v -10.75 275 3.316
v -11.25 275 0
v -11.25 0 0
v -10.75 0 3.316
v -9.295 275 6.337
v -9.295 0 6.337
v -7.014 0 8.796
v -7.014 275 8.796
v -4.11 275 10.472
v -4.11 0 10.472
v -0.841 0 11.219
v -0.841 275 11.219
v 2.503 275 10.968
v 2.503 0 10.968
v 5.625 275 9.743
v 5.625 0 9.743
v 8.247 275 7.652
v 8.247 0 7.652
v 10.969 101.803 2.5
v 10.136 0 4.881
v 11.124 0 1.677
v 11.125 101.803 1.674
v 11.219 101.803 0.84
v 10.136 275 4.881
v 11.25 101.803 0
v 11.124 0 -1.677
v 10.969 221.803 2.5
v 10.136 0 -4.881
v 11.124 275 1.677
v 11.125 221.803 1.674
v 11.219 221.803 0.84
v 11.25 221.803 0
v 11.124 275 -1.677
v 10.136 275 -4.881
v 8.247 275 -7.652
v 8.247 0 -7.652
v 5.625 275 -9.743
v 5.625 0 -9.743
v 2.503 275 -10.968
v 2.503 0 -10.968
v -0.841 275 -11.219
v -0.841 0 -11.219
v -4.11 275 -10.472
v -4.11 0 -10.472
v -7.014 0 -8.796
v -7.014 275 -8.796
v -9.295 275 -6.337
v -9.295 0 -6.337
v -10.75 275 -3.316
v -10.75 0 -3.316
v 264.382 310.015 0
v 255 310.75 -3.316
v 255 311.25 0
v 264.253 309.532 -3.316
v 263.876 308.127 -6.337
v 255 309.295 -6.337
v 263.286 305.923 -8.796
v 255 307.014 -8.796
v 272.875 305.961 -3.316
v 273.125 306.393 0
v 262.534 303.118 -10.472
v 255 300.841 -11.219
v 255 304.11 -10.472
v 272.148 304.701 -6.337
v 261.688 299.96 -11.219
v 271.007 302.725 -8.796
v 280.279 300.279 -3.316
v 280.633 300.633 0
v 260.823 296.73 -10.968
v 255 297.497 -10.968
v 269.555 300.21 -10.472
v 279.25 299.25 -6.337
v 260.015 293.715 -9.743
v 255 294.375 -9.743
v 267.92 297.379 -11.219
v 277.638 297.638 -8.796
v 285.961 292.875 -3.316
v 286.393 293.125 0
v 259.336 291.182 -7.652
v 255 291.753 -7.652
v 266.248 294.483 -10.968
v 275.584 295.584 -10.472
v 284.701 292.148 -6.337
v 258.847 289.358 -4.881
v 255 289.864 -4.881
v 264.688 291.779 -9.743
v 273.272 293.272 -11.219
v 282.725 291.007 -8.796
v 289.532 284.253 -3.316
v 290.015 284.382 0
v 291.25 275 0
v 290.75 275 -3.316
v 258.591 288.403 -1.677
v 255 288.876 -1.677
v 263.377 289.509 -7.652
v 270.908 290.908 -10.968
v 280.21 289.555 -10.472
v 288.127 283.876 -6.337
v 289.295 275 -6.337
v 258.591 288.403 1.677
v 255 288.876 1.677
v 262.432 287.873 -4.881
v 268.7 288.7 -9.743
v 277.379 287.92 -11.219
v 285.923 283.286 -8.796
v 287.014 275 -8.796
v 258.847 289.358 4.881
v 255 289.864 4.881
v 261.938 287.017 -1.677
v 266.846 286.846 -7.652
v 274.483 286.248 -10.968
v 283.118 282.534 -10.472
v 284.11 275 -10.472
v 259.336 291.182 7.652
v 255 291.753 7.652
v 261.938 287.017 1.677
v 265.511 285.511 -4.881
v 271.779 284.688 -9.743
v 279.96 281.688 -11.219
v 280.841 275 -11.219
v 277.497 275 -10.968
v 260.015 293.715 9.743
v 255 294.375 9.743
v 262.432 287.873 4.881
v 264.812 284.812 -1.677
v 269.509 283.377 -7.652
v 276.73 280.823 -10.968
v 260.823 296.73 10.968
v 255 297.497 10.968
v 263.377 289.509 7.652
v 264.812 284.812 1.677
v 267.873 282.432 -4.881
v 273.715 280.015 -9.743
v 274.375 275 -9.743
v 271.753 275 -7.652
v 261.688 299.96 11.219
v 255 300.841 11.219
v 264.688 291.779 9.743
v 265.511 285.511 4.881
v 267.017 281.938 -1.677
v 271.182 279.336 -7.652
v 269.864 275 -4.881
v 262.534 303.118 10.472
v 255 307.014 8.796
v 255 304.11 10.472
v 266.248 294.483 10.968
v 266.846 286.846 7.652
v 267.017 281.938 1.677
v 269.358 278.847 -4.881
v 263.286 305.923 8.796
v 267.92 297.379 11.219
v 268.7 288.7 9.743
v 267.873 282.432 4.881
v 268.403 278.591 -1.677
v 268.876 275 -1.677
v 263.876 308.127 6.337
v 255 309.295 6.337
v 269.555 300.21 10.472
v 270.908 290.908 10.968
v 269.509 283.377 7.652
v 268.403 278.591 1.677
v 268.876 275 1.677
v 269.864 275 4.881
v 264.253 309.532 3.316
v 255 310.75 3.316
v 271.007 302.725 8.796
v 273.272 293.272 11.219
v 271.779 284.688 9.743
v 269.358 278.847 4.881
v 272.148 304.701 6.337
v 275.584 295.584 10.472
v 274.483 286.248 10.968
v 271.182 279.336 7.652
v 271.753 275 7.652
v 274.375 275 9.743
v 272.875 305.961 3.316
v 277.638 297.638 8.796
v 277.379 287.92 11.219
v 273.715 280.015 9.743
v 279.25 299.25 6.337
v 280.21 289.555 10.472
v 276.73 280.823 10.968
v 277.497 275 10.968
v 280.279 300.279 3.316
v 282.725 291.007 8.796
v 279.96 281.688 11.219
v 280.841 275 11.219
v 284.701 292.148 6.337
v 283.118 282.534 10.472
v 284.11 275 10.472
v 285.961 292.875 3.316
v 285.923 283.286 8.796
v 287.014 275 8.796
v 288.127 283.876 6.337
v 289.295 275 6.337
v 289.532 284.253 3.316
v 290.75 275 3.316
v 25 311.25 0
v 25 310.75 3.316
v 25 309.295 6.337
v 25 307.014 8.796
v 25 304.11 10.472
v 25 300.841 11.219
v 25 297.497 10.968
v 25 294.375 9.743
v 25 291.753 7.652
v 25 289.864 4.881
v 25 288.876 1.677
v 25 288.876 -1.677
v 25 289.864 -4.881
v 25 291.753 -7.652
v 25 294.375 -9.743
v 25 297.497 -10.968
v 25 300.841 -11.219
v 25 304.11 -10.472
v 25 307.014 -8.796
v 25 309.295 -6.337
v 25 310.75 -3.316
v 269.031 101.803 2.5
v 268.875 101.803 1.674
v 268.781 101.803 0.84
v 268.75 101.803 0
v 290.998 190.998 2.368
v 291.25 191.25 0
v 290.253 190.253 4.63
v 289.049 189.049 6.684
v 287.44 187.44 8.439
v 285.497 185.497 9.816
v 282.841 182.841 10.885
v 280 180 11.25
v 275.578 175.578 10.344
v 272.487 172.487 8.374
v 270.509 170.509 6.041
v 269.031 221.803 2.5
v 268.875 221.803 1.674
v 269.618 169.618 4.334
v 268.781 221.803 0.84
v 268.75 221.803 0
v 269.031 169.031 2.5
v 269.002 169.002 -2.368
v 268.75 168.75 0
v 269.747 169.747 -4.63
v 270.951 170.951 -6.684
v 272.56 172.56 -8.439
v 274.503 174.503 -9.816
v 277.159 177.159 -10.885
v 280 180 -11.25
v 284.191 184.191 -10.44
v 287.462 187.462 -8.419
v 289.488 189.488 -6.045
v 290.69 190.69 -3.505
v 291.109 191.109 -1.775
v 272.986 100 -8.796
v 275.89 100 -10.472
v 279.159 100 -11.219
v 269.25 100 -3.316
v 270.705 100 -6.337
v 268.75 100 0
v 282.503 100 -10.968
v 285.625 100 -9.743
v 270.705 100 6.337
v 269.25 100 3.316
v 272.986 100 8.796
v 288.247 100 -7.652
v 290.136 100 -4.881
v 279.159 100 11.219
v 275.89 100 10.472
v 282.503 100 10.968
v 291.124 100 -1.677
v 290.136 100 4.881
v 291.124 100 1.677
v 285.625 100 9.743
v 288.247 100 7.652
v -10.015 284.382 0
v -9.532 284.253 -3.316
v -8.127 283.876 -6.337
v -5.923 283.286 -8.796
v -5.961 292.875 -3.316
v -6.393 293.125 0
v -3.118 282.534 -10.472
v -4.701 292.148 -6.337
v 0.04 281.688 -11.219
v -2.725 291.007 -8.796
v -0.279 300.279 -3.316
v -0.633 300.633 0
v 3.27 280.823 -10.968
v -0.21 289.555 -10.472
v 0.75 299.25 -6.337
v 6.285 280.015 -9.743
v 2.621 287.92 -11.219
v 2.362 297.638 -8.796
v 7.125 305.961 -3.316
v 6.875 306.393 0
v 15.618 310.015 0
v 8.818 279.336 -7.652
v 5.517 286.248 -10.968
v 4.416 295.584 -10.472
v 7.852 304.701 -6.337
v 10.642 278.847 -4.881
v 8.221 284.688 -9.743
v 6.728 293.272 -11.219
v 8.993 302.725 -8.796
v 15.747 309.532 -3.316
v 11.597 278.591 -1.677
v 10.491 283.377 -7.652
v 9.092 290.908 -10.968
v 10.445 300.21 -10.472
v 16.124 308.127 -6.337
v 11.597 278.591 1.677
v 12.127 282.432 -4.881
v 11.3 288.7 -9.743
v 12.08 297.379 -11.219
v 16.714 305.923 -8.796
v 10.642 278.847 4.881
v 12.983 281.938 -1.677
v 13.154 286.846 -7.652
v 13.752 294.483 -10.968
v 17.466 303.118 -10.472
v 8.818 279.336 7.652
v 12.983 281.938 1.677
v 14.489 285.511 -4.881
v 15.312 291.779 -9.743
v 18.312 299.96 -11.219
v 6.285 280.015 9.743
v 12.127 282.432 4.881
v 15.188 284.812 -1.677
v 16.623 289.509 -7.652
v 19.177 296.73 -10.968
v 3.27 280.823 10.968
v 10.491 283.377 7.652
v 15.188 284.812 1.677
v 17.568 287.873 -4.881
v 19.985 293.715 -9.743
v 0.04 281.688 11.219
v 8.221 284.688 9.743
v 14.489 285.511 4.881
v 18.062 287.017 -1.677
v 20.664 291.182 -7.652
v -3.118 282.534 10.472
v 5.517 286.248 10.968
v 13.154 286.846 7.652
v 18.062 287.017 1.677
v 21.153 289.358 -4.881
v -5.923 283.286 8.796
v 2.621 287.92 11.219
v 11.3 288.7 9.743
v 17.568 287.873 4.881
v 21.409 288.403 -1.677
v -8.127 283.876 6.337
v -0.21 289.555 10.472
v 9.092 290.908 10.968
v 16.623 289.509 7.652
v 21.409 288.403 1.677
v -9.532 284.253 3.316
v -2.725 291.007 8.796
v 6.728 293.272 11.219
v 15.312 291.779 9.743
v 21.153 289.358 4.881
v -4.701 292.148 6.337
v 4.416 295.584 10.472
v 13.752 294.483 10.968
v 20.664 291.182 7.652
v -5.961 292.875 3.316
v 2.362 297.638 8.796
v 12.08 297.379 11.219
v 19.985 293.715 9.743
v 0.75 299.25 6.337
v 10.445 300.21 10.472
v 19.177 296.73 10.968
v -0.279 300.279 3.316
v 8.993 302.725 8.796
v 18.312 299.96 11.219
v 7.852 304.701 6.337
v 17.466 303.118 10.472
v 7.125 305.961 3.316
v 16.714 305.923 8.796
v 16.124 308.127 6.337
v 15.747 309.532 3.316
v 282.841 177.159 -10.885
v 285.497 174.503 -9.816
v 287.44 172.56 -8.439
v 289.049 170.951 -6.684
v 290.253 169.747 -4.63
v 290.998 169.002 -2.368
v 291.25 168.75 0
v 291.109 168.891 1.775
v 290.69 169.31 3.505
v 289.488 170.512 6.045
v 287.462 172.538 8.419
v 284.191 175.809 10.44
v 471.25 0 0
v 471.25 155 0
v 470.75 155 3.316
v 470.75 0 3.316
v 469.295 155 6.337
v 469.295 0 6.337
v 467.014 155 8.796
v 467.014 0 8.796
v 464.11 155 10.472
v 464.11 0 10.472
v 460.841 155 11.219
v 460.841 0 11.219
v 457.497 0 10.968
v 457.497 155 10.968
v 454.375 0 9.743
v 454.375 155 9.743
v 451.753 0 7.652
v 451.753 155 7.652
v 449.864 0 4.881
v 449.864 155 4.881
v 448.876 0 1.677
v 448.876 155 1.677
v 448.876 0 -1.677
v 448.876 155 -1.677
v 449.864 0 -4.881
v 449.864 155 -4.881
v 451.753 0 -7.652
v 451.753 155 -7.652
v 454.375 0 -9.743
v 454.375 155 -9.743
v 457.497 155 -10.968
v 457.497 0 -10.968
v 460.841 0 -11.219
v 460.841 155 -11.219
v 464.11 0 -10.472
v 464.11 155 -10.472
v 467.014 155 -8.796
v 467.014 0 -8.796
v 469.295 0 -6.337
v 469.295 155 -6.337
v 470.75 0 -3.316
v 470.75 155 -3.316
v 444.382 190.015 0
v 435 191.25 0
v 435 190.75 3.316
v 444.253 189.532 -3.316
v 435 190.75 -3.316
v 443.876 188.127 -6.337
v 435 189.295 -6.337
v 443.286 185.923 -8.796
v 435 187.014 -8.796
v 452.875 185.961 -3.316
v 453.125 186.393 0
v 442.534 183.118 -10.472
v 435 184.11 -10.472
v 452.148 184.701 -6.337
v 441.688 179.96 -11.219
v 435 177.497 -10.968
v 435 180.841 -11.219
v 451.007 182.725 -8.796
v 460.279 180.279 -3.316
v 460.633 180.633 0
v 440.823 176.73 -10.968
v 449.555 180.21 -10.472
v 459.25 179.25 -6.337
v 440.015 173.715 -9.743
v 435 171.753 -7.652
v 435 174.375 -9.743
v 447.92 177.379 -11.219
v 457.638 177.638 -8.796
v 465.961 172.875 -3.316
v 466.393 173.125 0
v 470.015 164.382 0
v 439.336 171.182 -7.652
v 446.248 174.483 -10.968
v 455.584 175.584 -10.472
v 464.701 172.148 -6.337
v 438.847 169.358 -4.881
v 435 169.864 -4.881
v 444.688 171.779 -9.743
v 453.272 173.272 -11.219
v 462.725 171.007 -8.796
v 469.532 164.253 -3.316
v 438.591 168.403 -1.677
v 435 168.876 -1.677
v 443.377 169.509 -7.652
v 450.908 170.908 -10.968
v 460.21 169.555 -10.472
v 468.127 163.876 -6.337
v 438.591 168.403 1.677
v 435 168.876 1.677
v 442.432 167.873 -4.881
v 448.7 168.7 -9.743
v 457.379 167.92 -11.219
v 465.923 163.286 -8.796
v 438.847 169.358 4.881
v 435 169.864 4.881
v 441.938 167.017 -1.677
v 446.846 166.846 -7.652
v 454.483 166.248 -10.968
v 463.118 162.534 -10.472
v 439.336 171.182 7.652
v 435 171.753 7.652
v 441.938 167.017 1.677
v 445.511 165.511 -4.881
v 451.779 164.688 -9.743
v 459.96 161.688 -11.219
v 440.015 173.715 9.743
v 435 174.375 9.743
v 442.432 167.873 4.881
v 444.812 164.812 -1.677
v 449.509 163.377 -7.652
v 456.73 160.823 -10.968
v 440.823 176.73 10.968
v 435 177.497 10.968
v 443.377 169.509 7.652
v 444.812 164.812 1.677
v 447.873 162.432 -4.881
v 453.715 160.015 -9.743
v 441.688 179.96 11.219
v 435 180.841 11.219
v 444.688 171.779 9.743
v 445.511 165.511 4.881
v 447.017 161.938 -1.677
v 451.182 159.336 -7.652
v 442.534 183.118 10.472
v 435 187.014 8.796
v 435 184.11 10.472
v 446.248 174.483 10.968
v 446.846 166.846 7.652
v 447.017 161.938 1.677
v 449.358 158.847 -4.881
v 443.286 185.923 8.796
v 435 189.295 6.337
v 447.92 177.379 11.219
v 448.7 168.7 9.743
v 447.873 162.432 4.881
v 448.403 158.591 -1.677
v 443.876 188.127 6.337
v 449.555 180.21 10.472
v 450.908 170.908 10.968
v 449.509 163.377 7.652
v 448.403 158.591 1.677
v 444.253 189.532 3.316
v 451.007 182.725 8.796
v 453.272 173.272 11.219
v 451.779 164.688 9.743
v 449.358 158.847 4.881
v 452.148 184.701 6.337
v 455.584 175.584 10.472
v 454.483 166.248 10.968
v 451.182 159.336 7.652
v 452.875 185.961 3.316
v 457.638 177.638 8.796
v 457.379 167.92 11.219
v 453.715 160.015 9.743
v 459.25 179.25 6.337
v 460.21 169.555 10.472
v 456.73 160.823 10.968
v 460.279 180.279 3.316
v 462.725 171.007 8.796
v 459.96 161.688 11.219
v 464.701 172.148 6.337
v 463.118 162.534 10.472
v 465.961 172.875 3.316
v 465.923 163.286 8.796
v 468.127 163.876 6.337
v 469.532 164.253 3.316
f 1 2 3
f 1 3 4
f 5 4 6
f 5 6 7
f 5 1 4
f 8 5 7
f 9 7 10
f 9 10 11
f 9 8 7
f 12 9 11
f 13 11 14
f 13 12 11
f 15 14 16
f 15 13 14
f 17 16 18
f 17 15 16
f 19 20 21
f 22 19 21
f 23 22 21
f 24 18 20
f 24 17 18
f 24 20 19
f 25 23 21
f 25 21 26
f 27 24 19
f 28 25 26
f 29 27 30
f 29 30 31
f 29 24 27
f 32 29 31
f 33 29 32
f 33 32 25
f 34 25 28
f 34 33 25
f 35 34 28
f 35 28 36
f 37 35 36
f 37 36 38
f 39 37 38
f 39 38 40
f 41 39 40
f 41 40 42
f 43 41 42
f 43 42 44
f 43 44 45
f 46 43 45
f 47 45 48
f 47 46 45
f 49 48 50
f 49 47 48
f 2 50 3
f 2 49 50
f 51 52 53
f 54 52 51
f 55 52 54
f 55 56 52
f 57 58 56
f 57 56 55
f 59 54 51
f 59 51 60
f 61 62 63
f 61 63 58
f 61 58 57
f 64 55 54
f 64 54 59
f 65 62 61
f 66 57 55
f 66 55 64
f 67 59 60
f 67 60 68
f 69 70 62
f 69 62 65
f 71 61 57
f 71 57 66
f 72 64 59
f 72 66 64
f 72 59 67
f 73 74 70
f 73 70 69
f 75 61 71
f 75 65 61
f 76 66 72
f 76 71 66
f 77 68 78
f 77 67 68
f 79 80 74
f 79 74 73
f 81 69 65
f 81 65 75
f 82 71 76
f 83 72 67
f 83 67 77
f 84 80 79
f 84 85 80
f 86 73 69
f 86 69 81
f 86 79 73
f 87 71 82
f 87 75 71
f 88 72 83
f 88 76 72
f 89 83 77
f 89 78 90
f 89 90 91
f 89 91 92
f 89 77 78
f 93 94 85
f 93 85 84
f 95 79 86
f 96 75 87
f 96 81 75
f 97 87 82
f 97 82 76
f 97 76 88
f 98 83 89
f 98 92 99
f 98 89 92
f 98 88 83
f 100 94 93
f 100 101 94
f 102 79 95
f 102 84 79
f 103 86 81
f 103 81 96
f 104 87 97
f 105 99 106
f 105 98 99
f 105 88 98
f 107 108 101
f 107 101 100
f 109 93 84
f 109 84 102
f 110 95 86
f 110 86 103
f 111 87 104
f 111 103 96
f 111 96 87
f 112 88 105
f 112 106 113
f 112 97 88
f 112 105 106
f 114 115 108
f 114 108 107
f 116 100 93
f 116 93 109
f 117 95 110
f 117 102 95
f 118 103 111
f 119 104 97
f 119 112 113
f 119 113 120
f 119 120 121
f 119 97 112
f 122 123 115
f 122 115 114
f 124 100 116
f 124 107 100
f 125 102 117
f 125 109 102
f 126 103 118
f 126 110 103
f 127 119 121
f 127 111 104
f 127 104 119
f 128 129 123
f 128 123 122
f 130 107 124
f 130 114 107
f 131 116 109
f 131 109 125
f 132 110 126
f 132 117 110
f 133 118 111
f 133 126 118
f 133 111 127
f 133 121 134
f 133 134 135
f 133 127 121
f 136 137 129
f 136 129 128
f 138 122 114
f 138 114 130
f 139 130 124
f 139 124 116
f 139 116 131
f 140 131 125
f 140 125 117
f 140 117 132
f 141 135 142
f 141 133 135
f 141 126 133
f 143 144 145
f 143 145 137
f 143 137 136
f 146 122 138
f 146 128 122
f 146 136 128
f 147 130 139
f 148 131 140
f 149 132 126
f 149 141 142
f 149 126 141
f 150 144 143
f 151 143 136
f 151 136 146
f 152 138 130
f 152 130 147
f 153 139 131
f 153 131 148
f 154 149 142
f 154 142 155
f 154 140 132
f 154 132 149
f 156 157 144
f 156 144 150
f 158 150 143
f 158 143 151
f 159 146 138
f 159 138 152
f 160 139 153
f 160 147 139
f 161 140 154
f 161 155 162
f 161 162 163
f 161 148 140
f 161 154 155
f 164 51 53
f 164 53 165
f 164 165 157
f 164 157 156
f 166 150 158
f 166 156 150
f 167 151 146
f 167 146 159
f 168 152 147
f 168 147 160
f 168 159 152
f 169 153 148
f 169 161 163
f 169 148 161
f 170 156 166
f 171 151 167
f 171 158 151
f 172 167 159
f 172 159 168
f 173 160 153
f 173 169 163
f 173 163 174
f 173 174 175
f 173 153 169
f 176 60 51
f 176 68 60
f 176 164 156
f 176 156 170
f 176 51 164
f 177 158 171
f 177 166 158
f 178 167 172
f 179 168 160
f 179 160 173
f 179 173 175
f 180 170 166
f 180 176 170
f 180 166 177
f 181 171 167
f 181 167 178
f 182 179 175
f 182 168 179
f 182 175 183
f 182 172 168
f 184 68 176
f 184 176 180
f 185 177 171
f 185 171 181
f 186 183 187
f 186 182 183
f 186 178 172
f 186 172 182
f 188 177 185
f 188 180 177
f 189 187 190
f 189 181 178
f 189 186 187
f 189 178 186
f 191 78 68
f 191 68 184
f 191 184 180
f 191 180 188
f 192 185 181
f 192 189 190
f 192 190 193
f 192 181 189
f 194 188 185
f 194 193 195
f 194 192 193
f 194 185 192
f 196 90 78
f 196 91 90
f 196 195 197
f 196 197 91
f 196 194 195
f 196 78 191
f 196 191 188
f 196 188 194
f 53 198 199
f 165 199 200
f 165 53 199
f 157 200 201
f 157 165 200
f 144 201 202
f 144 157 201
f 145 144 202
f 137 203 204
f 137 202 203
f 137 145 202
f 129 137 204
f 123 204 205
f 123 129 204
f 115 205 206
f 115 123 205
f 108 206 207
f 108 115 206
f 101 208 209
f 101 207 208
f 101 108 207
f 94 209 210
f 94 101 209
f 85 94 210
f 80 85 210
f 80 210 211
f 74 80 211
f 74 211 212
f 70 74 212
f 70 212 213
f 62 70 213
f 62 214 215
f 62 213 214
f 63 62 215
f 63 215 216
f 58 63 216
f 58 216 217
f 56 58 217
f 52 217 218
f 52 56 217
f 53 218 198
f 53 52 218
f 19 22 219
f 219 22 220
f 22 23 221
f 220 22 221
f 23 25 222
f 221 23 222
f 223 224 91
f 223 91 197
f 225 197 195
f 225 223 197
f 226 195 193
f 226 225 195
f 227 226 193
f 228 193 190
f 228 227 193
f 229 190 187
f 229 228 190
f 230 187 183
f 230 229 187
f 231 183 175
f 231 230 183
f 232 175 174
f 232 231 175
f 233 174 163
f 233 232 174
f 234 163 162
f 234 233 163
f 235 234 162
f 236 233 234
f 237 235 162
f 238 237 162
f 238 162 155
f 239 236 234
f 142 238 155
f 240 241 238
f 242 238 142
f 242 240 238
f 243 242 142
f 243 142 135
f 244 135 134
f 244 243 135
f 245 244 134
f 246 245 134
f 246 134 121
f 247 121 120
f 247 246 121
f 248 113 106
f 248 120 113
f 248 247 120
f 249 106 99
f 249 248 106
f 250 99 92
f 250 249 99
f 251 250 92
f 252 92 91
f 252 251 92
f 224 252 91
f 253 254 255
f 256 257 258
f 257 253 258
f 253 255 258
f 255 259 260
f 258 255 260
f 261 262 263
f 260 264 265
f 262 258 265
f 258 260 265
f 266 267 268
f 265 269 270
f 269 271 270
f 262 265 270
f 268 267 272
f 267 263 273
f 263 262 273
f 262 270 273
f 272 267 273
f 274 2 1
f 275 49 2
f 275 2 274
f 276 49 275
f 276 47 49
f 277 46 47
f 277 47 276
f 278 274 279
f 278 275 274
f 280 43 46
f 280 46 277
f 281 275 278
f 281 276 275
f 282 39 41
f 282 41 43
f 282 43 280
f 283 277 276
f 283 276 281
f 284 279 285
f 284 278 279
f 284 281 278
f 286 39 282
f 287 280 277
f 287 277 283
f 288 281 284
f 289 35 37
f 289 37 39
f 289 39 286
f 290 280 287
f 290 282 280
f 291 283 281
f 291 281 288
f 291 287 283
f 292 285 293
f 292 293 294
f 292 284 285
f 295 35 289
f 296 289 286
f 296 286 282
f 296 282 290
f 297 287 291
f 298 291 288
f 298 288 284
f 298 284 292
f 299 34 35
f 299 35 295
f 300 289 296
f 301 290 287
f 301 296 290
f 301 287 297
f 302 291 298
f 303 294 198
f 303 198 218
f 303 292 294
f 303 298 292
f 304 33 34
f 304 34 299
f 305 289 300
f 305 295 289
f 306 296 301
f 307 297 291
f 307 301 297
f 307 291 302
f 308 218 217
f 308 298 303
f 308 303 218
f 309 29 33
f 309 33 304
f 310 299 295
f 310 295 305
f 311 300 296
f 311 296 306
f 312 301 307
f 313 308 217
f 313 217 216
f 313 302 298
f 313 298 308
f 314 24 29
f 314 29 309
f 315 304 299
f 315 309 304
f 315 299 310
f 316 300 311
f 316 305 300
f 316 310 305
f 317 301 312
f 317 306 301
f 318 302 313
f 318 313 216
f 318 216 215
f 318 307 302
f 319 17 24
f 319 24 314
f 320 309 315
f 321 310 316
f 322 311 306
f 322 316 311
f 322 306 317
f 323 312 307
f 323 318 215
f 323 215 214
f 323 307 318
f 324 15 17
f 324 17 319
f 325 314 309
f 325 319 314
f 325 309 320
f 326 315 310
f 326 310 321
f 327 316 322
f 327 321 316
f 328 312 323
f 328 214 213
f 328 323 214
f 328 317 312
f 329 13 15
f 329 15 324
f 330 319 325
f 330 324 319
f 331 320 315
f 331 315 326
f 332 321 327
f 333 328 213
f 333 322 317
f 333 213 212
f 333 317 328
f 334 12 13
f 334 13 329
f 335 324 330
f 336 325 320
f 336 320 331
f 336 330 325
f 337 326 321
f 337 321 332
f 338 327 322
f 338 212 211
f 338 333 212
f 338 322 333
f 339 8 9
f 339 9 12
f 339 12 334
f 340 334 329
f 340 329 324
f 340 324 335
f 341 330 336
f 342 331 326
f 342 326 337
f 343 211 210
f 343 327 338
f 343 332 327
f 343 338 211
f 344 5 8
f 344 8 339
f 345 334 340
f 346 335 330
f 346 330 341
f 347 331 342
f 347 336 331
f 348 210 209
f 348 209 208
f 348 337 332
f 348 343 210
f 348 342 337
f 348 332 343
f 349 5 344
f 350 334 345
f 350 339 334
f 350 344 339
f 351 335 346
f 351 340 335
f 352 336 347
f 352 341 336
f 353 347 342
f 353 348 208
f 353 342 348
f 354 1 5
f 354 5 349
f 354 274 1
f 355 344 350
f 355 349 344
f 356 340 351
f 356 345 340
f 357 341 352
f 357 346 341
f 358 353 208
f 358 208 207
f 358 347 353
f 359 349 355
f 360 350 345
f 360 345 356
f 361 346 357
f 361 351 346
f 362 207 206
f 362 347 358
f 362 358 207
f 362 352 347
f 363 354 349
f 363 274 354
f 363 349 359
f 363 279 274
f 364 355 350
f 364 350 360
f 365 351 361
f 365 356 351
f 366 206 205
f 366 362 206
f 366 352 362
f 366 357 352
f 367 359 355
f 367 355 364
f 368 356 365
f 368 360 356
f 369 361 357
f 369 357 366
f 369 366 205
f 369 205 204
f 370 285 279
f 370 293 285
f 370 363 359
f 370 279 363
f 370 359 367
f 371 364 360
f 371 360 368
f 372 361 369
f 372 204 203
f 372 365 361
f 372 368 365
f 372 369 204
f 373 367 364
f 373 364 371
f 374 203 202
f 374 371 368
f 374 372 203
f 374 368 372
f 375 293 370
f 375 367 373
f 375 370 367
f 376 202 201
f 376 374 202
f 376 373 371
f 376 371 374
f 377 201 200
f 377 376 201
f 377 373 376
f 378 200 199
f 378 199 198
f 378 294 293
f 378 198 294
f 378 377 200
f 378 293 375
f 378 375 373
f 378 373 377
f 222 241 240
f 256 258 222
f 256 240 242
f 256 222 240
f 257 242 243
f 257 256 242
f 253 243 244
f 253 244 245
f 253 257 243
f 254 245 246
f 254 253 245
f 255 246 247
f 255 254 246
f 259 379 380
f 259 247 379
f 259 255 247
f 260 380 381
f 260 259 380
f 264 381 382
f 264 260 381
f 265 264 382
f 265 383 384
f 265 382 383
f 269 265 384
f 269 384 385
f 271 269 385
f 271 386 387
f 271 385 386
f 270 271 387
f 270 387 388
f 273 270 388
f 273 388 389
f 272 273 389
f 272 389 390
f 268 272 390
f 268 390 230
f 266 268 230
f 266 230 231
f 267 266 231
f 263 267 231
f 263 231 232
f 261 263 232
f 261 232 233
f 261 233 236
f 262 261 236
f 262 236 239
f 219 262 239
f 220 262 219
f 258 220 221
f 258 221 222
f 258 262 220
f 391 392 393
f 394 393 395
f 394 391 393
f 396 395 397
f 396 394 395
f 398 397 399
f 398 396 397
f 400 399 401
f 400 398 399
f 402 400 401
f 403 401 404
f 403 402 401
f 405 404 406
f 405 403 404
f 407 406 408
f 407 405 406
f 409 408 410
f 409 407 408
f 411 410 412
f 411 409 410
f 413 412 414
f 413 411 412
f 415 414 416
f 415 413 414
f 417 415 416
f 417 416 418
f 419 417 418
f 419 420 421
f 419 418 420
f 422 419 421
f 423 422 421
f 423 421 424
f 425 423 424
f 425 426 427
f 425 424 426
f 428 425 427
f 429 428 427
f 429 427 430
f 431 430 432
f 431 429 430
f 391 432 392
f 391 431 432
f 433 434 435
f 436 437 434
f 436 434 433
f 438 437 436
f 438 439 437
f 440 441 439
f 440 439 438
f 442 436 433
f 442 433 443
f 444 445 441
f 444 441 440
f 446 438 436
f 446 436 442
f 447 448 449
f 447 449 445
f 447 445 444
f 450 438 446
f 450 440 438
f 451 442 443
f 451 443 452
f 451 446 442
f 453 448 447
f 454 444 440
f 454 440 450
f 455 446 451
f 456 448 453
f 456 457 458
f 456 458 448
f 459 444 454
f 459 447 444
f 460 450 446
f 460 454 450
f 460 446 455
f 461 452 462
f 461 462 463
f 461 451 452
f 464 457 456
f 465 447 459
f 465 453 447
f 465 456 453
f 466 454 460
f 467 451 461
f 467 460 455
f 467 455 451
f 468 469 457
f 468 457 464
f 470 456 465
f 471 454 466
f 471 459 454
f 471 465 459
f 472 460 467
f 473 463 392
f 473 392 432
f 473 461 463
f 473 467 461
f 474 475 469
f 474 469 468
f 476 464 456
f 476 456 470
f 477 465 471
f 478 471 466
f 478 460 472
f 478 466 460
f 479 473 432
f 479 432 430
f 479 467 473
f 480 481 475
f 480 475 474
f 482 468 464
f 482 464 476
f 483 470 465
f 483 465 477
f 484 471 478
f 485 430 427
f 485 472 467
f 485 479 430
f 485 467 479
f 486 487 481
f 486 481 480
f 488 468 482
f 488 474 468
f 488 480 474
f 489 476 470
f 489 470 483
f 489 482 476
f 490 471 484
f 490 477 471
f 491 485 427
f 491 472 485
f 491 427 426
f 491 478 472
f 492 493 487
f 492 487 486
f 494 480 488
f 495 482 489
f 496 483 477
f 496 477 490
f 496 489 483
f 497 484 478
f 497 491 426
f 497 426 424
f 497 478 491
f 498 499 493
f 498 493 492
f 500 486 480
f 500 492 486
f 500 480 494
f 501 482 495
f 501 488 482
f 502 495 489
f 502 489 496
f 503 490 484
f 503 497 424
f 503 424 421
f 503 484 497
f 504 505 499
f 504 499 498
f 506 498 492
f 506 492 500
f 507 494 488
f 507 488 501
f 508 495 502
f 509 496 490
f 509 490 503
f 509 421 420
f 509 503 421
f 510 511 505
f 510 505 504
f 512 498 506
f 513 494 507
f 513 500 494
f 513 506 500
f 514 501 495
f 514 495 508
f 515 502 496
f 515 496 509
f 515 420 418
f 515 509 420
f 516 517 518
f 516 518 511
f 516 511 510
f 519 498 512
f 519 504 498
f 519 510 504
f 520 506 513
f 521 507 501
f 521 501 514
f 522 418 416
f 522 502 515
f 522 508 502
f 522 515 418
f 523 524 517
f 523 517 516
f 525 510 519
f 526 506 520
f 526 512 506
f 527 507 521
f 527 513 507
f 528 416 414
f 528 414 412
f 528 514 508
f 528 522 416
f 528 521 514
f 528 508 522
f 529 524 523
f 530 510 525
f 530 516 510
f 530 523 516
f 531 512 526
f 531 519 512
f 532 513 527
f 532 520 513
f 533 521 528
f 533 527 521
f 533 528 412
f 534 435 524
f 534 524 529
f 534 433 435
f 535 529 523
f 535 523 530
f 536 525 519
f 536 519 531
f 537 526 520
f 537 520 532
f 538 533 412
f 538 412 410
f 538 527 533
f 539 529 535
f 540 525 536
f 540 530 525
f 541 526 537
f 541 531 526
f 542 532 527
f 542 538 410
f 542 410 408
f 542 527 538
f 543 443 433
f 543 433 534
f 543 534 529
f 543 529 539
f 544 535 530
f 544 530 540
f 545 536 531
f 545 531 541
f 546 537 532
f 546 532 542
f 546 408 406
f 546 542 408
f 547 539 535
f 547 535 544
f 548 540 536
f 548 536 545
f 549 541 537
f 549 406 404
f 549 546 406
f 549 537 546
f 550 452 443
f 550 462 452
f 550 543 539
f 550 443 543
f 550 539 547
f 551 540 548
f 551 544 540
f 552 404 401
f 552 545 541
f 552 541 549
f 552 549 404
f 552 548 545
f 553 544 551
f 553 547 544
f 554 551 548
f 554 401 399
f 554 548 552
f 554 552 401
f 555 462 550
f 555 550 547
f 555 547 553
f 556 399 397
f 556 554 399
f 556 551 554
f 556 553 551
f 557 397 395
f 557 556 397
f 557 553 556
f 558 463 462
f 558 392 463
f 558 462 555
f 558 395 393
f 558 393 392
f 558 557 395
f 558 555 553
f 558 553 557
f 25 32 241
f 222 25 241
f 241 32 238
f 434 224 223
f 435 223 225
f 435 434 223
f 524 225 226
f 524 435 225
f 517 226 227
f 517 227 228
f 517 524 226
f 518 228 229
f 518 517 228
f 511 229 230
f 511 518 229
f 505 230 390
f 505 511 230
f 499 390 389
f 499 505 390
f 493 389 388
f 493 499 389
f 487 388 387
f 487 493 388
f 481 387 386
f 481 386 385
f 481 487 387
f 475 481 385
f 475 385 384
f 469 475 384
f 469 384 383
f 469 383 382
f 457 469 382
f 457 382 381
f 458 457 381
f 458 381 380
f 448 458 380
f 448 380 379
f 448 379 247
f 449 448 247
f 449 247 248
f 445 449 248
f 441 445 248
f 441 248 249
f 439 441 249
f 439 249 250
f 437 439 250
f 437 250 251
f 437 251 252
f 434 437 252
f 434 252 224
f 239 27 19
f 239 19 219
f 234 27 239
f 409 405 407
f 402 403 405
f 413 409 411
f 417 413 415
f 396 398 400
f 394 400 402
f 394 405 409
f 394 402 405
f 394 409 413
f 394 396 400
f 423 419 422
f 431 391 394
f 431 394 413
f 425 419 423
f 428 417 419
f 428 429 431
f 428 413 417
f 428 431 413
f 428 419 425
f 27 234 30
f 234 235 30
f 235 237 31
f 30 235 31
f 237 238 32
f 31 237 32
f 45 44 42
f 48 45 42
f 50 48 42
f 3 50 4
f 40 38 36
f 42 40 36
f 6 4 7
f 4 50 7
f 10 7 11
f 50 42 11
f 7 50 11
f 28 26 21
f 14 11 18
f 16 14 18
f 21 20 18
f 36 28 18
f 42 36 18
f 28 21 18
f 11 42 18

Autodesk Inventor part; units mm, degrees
ref_plane "YZ Plane" through (0, 0, 0) normal (1, 0, 0) x (0, 1, 0)
ref_plane "XY Plane" through (0, 0, 0) normal (0, 0, 1) x (1, 0, 0)
sketch "Sketch1" plane through (0, 0, 0) normal (0, 0, 1) x (1, 0, 0)
  line L0 (0, 0) -> (0, 275)
  line L1 (25, 300) -> (255, 300)
  line L2 (280, 275) -> (280, 180)
  line L3 (280, 180) -> (435, 180)
  line L4 (460, 155) -> (460, 0)
  arc A0 (25, 300) -> (0, 275) centre (25, 275) ccw
  arc A1 (280, 275) -> (255, 300) centre (255, 275) ccw
  arc A2 (460, 155) -> (435, 180) centre (435, 155) ccw
  line L5 (280, 180) -> (280, 93.2639)
  point P0 (0, 300)
  point P1 (280, 300)
  point P2 (460, 180)
  dimension "d0" = 300
  dimension "d1" = 280
  dimension "d2" = 120
  dimension "d3" = 180
  dimension "d4" = 25
  dimension "d5" = 25
  dimension "d6" = 25
  dimension "d7" = 86.7361
sketch "Sketch2" plane through (0, 0, 0) normal (0, 1, 0) x (-1, 0, 0)
  circle A0 centre (0, 0) radius 11.25
  dimension "d8" = 22.5
sweep "Sweep1" add profiles "Sketch2" path "Sketch1" path curves L0 A0 L1 A1 L2 L3 A2 L4
sketch "Sketch3" plane through (0, 0, 0) normal (0, 1, 0) x (-1, 0, 0)
  point P0 (0, 0)
sketch "Sketch4" plane through (0, 0, 0) normal (0, 0, 1) x (1, 0, 0)
  line L0 (280, 180) -> (280, 180) projected
  line L1 (280, 180) -> (280, 100)
  point P0 (0, 0)
  dimension "d11" = 80
ref_plane "Work Plane1" through (0, 100, 0) normal (0, 1, 0) x (-1, 0, 0)
sketch "Sketch5" plane through (0, 100, 0) normal (0, 1, 0) x (-1, 0, 0)
  circle A0 centre (-280, 0) radius 11.25 projected
  circle A1 centre (-280, 0) radius 11.25
  point P0 (0, 0)
  dimension "d13" = 22.5
sweep "Sweep2" add profiles "Sketch5" path "Sketch4" path curves L1
sketch "Sketch6" plane through (0, 0, 0) normal (0, 0, 1) x (1, 0, 0)
  line L0 (0, 101.8033) -> (281.8033, 101.8033)
  line L1 (281.8033, 101.8033) -> (281.8033, 221.8033)
  line L2 (281.8033, 221.8033) -> (0, 221.8033)
  line L3 (0, 221.8033) -> (0, 101.8033)
  point P0 (0, 0)
  dimension "d16" = 120
extrude "Extrusion1" add sketch "Sketch6" along normal blind 2.5
properties part number "frame of armrest"
